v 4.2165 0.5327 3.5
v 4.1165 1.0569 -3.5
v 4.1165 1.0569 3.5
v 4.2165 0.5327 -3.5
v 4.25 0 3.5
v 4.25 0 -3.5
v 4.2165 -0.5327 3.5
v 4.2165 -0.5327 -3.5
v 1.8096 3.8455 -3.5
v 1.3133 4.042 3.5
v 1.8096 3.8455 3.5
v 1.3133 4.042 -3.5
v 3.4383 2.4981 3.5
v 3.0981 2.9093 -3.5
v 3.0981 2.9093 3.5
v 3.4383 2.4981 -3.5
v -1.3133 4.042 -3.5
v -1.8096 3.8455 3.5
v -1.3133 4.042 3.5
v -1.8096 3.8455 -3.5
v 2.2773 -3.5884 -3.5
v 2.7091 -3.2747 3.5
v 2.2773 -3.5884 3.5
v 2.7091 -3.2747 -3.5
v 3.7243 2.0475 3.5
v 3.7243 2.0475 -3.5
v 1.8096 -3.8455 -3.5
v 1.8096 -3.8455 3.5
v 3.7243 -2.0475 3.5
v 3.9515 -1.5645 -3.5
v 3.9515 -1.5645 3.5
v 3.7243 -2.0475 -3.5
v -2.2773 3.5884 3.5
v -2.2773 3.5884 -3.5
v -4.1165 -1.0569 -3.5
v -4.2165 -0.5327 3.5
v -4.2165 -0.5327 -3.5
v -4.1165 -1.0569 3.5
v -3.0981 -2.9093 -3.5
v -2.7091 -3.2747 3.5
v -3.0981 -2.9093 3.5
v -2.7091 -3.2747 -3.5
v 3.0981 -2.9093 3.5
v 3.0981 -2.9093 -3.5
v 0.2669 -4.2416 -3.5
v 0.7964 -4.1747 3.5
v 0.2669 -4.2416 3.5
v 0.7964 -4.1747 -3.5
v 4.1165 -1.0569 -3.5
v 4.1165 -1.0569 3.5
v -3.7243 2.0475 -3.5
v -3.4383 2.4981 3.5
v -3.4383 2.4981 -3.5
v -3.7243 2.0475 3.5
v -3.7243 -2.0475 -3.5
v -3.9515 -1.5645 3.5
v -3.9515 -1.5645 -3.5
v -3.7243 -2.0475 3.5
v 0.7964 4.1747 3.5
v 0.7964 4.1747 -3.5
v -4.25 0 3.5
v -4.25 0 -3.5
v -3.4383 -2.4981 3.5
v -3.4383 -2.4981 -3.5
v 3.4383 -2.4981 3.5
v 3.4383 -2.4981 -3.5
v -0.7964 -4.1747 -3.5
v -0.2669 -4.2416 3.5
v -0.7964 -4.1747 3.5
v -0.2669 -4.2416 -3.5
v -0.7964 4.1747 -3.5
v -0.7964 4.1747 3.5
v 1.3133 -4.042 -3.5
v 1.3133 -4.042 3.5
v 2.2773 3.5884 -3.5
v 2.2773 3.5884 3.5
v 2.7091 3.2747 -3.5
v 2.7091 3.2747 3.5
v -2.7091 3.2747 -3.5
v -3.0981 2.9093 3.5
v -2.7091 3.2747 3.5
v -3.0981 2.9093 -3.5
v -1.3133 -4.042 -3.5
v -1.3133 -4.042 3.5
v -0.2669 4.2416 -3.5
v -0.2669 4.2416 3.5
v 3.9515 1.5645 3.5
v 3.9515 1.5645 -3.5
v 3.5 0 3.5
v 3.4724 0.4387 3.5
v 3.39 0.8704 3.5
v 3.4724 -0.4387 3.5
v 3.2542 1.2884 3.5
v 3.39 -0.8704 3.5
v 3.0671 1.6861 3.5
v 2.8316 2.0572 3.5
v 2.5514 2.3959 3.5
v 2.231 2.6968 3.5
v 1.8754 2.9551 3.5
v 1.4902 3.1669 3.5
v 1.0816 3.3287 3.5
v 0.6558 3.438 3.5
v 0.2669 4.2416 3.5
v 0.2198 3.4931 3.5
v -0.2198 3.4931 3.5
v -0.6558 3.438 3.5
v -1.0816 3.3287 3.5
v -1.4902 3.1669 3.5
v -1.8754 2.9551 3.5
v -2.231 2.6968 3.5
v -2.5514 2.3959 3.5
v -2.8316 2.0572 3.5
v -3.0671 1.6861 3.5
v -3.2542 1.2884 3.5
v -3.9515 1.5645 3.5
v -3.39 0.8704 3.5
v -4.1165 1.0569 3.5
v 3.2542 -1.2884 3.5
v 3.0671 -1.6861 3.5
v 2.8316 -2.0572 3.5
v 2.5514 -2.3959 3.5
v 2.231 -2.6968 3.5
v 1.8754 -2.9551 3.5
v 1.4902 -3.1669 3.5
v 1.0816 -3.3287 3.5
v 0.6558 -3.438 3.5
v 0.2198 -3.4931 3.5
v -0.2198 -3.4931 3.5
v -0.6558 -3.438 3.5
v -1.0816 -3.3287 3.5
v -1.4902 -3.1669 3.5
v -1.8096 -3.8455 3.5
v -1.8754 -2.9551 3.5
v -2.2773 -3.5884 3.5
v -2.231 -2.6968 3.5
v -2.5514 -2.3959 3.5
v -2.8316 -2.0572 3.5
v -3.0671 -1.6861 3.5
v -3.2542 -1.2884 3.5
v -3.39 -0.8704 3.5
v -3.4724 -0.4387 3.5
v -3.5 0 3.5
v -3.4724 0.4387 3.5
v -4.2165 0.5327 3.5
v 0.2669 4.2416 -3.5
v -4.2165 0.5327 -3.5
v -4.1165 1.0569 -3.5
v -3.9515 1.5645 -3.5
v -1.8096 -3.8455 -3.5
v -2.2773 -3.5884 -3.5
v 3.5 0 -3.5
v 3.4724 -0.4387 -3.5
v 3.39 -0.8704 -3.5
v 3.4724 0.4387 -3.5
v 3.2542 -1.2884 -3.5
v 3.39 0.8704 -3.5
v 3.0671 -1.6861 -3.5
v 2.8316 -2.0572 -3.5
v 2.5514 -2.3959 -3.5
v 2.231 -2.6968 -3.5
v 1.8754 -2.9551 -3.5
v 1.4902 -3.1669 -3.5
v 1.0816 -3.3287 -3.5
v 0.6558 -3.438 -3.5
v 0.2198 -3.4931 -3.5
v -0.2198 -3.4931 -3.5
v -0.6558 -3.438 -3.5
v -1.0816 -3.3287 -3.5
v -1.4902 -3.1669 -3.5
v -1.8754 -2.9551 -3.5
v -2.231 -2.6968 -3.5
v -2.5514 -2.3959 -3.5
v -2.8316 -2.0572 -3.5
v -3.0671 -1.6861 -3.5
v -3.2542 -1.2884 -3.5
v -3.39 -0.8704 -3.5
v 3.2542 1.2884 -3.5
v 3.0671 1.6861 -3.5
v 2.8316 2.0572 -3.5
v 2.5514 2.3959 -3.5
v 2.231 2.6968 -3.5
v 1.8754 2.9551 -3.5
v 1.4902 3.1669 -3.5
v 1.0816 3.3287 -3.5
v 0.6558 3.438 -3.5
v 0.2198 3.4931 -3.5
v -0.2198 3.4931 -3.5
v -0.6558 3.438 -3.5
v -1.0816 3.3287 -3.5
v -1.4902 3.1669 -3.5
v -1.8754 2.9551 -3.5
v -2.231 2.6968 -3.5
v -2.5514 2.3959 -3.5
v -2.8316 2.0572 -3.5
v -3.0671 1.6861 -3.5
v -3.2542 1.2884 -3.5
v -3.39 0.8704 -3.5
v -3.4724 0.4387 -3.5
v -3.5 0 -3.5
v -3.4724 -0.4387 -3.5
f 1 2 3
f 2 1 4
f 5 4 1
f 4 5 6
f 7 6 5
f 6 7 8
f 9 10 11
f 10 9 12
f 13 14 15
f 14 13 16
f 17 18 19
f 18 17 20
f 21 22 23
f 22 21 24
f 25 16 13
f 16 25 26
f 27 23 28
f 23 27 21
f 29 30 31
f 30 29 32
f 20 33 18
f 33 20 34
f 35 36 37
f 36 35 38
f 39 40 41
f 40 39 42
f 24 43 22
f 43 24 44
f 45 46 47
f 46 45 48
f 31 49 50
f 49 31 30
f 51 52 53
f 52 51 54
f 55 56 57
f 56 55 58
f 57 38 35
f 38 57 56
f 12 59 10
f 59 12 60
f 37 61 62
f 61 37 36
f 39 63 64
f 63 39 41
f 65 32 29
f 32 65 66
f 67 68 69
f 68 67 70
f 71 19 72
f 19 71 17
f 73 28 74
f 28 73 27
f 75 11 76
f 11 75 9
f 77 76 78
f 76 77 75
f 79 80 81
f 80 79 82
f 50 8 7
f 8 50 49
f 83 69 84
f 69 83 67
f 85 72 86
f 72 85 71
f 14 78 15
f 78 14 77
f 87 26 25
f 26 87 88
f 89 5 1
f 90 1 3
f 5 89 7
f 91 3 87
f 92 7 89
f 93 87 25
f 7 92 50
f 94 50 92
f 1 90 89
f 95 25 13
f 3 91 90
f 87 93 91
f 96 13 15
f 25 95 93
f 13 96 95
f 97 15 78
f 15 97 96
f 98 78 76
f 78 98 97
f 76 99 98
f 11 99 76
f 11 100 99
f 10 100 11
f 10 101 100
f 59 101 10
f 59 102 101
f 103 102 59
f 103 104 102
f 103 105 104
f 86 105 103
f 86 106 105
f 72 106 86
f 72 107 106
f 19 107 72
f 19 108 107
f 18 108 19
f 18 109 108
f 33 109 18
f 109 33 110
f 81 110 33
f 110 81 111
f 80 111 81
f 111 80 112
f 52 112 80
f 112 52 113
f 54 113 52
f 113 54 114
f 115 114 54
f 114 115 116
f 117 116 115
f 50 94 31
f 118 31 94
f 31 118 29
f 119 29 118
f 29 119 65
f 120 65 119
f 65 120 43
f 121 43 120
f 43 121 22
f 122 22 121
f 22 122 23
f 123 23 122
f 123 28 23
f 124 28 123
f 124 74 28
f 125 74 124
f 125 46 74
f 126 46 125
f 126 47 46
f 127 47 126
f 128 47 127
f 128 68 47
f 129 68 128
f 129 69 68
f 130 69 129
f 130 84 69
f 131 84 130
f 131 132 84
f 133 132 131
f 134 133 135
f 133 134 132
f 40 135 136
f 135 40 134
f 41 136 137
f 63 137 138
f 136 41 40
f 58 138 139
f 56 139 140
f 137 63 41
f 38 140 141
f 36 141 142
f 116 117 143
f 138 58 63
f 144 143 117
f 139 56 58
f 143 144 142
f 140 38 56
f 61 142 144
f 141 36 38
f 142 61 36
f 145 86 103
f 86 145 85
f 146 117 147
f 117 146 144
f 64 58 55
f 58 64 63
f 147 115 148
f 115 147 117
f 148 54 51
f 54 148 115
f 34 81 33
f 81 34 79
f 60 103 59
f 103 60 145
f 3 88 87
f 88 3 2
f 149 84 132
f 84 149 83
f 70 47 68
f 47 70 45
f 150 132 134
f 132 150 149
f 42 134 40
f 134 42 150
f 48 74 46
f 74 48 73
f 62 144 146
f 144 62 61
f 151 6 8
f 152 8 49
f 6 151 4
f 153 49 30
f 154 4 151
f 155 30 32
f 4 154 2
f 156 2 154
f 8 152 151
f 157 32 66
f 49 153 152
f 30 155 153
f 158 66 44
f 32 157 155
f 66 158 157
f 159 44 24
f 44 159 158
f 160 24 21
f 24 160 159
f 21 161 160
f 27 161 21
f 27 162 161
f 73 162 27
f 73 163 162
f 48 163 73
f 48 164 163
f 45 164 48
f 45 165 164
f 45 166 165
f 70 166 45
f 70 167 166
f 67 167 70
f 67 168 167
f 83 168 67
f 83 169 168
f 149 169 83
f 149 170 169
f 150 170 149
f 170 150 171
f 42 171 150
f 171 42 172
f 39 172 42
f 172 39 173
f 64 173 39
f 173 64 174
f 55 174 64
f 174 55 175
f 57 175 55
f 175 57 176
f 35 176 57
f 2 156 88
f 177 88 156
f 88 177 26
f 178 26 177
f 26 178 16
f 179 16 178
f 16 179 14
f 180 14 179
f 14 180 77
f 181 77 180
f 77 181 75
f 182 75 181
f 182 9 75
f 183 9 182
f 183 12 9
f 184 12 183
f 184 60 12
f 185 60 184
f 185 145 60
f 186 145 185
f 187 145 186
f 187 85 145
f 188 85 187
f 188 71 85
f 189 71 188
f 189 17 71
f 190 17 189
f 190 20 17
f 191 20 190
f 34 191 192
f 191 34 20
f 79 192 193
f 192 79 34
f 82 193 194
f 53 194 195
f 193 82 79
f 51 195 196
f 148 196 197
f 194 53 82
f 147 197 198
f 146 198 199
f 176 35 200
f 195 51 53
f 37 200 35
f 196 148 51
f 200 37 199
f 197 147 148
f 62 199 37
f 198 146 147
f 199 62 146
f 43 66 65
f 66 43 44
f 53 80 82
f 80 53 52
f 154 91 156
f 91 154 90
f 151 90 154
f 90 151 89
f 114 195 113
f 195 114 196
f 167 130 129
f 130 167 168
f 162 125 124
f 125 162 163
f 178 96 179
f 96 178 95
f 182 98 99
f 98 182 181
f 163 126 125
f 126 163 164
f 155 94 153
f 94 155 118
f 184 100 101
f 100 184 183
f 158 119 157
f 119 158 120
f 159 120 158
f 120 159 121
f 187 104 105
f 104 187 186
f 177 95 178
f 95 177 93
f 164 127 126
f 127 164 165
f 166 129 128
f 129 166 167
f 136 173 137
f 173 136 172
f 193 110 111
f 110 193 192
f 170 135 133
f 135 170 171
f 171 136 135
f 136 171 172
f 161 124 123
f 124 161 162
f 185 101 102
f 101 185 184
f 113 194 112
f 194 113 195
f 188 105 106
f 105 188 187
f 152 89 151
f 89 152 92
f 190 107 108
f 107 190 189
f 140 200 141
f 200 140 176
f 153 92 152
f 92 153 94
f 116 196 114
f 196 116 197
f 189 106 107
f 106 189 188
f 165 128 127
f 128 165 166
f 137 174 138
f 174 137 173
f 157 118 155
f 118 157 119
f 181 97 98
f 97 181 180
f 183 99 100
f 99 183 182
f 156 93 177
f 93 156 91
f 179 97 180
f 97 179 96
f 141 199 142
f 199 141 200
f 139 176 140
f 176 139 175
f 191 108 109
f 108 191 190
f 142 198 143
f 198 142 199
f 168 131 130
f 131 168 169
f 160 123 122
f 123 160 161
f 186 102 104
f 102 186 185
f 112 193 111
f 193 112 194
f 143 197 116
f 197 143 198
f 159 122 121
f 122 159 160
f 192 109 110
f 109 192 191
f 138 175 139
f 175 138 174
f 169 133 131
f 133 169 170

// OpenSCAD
$fn = 50;


difference() {
	union() {
		translate(v = [0, 0, -3.5000000000]) {
			cylinder(h = 7, r = 4.2500000000);
		}
	}
	union() {
		translate(v = [0, 0, -100.0000000000]) {
			cylinder(h = 200, r = 3.5000000000);
		}
	}
}
